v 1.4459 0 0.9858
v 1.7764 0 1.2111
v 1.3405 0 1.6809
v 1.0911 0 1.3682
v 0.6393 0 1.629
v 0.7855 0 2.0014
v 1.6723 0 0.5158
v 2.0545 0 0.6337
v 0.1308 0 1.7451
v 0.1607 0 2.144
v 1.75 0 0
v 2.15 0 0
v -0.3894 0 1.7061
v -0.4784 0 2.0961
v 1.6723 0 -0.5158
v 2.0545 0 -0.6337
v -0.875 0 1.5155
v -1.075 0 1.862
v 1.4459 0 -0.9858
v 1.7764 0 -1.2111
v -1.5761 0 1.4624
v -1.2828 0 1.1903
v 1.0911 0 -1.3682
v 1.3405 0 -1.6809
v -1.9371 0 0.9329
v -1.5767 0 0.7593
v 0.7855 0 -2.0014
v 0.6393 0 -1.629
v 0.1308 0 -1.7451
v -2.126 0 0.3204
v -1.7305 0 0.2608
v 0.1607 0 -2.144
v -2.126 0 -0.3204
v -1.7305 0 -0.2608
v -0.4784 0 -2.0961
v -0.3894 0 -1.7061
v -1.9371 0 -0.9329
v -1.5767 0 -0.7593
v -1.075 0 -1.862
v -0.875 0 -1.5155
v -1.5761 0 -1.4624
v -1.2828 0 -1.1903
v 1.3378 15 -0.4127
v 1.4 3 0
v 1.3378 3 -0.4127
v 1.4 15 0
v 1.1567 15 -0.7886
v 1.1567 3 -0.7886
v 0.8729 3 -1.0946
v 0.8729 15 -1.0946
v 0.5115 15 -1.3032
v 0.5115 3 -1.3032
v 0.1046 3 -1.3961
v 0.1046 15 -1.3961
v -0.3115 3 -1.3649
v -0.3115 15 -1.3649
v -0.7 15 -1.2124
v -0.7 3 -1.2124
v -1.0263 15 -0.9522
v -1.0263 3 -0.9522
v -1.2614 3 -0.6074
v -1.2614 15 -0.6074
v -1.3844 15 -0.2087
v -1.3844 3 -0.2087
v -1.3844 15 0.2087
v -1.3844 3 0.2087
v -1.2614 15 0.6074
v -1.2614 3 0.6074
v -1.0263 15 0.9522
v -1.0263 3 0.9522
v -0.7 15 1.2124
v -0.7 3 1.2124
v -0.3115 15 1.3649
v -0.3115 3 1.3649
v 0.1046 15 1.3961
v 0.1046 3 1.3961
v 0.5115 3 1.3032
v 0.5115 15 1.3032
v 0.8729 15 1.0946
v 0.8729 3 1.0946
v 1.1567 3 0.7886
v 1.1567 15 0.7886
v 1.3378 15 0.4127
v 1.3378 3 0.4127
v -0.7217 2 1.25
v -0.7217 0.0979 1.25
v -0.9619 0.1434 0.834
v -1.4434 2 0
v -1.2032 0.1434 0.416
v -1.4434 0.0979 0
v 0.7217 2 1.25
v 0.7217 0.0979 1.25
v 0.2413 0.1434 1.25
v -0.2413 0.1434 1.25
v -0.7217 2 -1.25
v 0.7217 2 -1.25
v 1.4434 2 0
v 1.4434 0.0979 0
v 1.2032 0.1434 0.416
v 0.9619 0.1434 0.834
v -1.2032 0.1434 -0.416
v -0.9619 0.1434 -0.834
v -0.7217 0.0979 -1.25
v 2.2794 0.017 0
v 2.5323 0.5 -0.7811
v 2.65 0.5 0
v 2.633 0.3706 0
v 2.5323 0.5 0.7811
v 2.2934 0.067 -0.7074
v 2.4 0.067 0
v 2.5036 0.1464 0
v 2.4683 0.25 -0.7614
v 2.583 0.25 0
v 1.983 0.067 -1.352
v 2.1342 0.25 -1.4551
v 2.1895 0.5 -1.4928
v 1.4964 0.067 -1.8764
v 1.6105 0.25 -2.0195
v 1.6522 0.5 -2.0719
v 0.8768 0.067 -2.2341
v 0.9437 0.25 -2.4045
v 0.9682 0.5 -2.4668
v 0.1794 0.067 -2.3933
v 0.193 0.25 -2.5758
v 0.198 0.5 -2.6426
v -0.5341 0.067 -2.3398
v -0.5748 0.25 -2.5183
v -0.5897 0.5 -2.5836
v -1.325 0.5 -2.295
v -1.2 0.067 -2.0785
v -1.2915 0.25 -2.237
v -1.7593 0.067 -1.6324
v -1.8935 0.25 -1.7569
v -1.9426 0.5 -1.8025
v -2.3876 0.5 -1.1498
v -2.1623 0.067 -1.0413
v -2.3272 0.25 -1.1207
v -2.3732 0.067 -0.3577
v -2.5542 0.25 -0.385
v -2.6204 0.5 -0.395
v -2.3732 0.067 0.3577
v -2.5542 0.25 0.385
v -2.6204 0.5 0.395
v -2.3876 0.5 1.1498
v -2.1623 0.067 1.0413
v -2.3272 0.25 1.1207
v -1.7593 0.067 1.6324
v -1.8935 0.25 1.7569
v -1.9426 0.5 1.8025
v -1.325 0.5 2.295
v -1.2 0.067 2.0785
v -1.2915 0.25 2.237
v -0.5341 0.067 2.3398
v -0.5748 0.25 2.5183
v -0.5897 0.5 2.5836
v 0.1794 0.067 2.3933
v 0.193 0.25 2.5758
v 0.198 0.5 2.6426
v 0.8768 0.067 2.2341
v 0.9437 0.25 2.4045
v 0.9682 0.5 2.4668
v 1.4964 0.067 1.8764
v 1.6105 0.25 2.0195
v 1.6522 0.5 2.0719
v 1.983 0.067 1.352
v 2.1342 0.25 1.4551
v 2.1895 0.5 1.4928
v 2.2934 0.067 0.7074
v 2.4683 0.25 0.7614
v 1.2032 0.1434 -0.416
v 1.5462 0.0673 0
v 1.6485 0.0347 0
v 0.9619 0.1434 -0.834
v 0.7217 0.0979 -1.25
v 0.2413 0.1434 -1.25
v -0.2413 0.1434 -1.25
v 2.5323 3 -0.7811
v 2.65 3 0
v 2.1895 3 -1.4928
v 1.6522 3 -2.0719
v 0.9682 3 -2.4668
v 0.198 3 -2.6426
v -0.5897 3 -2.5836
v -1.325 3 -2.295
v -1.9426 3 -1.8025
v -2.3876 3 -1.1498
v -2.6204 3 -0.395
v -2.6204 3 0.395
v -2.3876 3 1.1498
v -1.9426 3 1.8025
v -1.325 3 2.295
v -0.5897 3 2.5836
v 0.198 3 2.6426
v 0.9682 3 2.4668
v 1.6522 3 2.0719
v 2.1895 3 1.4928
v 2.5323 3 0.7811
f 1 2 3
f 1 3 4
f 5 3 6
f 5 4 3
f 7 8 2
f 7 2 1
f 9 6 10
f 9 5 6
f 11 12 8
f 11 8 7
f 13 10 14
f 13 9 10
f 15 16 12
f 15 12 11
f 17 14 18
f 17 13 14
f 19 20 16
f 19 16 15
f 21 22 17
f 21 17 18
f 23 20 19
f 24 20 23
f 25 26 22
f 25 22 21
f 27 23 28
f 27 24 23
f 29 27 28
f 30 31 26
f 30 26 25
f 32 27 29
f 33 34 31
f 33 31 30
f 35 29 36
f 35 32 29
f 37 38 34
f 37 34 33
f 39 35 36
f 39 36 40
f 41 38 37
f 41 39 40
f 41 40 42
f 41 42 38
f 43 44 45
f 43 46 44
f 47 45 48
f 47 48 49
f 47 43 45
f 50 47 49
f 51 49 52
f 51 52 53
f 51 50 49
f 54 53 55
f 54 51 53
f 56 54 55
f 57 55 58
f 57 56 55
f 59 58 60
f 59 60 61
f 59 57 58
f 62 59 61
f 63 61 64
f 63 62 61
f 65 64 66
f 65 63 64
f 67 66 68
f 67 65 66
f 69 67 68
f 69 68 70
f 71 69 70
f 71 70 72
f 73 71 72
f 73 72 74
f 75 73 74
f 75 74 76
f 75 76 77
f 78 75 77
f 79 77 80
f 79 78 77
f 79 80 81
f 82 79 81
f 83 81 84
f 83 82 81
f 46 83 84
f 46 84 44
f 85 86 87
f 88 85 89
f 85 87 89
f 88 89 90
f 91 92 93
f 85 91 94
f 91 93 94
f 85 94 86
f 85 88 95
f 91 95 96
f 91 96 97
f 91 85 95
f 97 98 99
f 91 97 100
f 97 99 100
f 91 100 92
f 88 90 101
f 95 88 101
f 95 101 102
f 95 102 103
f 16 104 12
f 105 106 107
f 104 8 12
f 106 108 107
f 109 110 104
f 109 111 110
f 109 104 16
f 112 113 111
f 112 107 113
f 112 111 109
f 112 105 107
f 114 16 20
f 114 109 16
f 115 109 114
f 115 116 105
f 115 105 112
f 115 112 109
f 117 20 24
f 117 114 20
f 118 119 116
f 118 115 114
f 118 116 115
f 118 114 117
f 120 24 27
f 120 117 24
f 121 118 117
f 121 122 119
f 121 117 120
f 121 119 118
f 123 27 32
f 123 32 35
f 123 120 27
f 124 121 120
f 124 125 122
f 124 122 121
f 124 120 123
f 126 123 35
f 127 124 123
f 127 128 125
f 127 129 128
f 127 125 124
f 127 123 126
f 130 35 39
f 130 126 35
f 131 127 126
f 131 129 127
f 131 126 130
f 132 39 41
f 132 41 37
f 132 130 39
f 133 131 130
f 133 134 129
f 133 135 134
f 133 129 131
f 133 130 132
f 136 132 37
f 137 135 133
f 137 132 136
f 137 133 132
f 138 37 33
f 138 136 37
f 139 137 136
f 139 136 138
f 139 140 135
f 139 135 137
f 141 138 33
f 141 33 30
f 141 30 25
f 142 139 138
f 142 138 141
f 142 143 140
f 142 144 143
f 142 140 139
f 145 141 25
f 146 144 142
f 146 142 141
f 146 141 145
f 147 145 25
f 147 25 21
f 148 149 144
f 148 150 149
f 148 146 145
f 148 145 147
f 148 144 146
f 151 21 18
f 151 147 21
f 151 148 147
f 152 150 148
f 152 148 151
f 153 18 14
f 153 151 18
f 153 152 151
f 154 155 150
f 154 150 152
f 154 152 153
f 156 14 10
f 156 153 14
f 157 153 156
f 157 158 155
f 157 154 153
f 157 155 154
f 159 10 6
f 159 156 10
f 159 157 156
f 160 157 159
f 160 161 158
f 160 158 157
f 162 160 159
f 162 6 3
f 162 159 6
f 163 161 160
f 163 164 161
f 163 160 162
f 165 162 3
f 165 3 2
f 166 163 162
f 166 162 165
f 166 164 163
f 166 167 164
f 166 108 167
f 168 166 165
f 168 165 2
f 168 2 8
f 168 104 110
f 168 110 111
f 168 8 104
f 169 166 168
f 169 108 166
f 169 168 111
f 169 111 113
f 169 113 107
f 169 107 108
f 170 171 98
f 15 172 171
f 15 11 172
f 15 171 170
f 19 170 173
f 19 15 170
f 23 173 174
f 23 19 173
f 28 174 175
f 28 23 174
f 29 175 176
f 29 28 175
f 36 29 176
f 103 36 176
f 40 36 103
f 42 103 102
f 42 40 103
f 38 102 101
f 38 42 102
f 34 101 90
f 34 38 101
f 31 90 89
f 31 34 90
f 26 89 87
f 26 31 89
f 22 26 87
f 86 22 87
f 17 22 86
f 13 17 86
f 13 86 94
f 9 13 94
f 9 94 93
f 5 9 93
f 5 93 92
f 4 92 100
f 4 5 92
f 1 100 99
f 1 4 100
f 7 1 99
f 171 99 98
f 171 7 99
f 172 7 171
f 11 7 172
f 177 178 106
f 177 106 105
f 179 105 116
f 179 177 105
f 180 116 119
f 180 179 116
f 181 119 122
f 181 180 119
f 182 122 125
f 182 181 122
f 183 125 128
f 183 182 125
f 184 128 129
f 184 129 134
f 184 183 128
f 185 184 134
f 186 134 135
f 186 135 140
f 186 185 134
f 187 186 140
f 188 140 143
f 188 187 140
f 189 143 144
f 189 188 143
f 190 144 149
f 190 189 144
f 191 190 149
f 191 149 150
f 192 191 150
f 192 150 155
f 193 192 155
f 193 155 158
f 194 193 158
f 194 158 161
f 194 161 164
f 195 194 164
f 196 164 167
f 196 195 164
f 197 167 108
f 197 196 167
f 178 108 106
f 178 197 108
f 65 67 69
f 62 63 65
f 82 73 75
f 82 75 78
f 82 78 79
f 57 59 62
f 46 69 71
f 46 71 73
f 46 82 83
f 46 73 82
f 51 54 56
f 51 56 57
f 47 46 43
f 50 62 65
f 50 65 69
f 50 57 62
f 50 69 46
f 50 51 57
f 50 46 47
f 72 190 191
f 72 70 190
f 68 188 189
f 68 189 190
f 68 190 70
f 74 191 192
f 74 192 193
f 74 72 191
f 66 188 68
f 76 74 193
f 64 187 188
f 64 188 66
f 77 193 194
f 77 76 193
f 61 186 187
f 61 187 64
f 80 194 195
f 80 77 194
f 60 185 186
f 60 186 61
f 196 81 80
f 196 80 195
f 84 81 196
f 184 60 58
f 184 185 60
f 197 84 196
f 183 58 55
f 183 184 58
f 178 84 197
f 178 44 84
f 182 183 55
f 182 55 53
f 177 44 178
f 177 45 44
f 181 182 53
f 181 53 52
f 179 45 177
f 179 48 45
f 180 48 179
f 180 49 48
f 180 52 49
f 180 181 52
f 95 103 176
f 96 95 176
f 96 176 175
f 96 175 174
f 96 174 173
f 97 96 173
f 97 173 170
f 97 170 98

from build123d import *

# Parameters (mm, degrees)
CUT_EXTRUDE1_DEPTH = 2
FILLET1_R          = 0.5


with BuildPart() as part:
    # Sketch2 → Revolve1 (revolve)
    with BuildSketch(Plane.XY):
        Polygon((0, 0), (2.65, 0), (2.65, 3), (1.4, 3), (1.4, 15), (0, 15), align=None)
    revolve(axis=Axis((0, 0, 0), (0, 1, 0)))

    # Sketch3 → Cut-Extrude1 (cut)
    with BuildSketch(Plane.XZ):
        Polygon((-1.443375673, 0), (-0.721687836, -1.25), (0.721687836, -1.25), (1.443375673, 0), (0.721687836, 1.25), (-0.721687836, 1.25), align=None)
    extrude(amount=-CUT_EXTRUDE1_DEPTH, mode=Mode.SUBTRACT)

    # Sketch6 → Cut-Revolve1 (revolve, cut)
    with BuildSketch(Plane(origin=(0, 0, 0), x_dir=(-1, 0, 0), z_dir=(0, 0, -1))):
        with BuildLine():
            Line((0, 0), (0, 0.3))
            ThreePointArc((0, 0.3), (-0.887764045, 0.22445693), (-1.75, 0))
            Line((-1.75, 0), (0, 0))
        make_face()
    revolve(axis=Axis((0, 0, 0), (0, 1, 0)), mode=Mode.SUBTRACT)

    # Fillet1
    fillet1_edges = [part.edges().sort_by_distance(p)[0] for p in [
        (-2.65, 0, 0),
    ]]
    fillet(fillet1_edges, radius=FILLET1_R)


solid = part.part
